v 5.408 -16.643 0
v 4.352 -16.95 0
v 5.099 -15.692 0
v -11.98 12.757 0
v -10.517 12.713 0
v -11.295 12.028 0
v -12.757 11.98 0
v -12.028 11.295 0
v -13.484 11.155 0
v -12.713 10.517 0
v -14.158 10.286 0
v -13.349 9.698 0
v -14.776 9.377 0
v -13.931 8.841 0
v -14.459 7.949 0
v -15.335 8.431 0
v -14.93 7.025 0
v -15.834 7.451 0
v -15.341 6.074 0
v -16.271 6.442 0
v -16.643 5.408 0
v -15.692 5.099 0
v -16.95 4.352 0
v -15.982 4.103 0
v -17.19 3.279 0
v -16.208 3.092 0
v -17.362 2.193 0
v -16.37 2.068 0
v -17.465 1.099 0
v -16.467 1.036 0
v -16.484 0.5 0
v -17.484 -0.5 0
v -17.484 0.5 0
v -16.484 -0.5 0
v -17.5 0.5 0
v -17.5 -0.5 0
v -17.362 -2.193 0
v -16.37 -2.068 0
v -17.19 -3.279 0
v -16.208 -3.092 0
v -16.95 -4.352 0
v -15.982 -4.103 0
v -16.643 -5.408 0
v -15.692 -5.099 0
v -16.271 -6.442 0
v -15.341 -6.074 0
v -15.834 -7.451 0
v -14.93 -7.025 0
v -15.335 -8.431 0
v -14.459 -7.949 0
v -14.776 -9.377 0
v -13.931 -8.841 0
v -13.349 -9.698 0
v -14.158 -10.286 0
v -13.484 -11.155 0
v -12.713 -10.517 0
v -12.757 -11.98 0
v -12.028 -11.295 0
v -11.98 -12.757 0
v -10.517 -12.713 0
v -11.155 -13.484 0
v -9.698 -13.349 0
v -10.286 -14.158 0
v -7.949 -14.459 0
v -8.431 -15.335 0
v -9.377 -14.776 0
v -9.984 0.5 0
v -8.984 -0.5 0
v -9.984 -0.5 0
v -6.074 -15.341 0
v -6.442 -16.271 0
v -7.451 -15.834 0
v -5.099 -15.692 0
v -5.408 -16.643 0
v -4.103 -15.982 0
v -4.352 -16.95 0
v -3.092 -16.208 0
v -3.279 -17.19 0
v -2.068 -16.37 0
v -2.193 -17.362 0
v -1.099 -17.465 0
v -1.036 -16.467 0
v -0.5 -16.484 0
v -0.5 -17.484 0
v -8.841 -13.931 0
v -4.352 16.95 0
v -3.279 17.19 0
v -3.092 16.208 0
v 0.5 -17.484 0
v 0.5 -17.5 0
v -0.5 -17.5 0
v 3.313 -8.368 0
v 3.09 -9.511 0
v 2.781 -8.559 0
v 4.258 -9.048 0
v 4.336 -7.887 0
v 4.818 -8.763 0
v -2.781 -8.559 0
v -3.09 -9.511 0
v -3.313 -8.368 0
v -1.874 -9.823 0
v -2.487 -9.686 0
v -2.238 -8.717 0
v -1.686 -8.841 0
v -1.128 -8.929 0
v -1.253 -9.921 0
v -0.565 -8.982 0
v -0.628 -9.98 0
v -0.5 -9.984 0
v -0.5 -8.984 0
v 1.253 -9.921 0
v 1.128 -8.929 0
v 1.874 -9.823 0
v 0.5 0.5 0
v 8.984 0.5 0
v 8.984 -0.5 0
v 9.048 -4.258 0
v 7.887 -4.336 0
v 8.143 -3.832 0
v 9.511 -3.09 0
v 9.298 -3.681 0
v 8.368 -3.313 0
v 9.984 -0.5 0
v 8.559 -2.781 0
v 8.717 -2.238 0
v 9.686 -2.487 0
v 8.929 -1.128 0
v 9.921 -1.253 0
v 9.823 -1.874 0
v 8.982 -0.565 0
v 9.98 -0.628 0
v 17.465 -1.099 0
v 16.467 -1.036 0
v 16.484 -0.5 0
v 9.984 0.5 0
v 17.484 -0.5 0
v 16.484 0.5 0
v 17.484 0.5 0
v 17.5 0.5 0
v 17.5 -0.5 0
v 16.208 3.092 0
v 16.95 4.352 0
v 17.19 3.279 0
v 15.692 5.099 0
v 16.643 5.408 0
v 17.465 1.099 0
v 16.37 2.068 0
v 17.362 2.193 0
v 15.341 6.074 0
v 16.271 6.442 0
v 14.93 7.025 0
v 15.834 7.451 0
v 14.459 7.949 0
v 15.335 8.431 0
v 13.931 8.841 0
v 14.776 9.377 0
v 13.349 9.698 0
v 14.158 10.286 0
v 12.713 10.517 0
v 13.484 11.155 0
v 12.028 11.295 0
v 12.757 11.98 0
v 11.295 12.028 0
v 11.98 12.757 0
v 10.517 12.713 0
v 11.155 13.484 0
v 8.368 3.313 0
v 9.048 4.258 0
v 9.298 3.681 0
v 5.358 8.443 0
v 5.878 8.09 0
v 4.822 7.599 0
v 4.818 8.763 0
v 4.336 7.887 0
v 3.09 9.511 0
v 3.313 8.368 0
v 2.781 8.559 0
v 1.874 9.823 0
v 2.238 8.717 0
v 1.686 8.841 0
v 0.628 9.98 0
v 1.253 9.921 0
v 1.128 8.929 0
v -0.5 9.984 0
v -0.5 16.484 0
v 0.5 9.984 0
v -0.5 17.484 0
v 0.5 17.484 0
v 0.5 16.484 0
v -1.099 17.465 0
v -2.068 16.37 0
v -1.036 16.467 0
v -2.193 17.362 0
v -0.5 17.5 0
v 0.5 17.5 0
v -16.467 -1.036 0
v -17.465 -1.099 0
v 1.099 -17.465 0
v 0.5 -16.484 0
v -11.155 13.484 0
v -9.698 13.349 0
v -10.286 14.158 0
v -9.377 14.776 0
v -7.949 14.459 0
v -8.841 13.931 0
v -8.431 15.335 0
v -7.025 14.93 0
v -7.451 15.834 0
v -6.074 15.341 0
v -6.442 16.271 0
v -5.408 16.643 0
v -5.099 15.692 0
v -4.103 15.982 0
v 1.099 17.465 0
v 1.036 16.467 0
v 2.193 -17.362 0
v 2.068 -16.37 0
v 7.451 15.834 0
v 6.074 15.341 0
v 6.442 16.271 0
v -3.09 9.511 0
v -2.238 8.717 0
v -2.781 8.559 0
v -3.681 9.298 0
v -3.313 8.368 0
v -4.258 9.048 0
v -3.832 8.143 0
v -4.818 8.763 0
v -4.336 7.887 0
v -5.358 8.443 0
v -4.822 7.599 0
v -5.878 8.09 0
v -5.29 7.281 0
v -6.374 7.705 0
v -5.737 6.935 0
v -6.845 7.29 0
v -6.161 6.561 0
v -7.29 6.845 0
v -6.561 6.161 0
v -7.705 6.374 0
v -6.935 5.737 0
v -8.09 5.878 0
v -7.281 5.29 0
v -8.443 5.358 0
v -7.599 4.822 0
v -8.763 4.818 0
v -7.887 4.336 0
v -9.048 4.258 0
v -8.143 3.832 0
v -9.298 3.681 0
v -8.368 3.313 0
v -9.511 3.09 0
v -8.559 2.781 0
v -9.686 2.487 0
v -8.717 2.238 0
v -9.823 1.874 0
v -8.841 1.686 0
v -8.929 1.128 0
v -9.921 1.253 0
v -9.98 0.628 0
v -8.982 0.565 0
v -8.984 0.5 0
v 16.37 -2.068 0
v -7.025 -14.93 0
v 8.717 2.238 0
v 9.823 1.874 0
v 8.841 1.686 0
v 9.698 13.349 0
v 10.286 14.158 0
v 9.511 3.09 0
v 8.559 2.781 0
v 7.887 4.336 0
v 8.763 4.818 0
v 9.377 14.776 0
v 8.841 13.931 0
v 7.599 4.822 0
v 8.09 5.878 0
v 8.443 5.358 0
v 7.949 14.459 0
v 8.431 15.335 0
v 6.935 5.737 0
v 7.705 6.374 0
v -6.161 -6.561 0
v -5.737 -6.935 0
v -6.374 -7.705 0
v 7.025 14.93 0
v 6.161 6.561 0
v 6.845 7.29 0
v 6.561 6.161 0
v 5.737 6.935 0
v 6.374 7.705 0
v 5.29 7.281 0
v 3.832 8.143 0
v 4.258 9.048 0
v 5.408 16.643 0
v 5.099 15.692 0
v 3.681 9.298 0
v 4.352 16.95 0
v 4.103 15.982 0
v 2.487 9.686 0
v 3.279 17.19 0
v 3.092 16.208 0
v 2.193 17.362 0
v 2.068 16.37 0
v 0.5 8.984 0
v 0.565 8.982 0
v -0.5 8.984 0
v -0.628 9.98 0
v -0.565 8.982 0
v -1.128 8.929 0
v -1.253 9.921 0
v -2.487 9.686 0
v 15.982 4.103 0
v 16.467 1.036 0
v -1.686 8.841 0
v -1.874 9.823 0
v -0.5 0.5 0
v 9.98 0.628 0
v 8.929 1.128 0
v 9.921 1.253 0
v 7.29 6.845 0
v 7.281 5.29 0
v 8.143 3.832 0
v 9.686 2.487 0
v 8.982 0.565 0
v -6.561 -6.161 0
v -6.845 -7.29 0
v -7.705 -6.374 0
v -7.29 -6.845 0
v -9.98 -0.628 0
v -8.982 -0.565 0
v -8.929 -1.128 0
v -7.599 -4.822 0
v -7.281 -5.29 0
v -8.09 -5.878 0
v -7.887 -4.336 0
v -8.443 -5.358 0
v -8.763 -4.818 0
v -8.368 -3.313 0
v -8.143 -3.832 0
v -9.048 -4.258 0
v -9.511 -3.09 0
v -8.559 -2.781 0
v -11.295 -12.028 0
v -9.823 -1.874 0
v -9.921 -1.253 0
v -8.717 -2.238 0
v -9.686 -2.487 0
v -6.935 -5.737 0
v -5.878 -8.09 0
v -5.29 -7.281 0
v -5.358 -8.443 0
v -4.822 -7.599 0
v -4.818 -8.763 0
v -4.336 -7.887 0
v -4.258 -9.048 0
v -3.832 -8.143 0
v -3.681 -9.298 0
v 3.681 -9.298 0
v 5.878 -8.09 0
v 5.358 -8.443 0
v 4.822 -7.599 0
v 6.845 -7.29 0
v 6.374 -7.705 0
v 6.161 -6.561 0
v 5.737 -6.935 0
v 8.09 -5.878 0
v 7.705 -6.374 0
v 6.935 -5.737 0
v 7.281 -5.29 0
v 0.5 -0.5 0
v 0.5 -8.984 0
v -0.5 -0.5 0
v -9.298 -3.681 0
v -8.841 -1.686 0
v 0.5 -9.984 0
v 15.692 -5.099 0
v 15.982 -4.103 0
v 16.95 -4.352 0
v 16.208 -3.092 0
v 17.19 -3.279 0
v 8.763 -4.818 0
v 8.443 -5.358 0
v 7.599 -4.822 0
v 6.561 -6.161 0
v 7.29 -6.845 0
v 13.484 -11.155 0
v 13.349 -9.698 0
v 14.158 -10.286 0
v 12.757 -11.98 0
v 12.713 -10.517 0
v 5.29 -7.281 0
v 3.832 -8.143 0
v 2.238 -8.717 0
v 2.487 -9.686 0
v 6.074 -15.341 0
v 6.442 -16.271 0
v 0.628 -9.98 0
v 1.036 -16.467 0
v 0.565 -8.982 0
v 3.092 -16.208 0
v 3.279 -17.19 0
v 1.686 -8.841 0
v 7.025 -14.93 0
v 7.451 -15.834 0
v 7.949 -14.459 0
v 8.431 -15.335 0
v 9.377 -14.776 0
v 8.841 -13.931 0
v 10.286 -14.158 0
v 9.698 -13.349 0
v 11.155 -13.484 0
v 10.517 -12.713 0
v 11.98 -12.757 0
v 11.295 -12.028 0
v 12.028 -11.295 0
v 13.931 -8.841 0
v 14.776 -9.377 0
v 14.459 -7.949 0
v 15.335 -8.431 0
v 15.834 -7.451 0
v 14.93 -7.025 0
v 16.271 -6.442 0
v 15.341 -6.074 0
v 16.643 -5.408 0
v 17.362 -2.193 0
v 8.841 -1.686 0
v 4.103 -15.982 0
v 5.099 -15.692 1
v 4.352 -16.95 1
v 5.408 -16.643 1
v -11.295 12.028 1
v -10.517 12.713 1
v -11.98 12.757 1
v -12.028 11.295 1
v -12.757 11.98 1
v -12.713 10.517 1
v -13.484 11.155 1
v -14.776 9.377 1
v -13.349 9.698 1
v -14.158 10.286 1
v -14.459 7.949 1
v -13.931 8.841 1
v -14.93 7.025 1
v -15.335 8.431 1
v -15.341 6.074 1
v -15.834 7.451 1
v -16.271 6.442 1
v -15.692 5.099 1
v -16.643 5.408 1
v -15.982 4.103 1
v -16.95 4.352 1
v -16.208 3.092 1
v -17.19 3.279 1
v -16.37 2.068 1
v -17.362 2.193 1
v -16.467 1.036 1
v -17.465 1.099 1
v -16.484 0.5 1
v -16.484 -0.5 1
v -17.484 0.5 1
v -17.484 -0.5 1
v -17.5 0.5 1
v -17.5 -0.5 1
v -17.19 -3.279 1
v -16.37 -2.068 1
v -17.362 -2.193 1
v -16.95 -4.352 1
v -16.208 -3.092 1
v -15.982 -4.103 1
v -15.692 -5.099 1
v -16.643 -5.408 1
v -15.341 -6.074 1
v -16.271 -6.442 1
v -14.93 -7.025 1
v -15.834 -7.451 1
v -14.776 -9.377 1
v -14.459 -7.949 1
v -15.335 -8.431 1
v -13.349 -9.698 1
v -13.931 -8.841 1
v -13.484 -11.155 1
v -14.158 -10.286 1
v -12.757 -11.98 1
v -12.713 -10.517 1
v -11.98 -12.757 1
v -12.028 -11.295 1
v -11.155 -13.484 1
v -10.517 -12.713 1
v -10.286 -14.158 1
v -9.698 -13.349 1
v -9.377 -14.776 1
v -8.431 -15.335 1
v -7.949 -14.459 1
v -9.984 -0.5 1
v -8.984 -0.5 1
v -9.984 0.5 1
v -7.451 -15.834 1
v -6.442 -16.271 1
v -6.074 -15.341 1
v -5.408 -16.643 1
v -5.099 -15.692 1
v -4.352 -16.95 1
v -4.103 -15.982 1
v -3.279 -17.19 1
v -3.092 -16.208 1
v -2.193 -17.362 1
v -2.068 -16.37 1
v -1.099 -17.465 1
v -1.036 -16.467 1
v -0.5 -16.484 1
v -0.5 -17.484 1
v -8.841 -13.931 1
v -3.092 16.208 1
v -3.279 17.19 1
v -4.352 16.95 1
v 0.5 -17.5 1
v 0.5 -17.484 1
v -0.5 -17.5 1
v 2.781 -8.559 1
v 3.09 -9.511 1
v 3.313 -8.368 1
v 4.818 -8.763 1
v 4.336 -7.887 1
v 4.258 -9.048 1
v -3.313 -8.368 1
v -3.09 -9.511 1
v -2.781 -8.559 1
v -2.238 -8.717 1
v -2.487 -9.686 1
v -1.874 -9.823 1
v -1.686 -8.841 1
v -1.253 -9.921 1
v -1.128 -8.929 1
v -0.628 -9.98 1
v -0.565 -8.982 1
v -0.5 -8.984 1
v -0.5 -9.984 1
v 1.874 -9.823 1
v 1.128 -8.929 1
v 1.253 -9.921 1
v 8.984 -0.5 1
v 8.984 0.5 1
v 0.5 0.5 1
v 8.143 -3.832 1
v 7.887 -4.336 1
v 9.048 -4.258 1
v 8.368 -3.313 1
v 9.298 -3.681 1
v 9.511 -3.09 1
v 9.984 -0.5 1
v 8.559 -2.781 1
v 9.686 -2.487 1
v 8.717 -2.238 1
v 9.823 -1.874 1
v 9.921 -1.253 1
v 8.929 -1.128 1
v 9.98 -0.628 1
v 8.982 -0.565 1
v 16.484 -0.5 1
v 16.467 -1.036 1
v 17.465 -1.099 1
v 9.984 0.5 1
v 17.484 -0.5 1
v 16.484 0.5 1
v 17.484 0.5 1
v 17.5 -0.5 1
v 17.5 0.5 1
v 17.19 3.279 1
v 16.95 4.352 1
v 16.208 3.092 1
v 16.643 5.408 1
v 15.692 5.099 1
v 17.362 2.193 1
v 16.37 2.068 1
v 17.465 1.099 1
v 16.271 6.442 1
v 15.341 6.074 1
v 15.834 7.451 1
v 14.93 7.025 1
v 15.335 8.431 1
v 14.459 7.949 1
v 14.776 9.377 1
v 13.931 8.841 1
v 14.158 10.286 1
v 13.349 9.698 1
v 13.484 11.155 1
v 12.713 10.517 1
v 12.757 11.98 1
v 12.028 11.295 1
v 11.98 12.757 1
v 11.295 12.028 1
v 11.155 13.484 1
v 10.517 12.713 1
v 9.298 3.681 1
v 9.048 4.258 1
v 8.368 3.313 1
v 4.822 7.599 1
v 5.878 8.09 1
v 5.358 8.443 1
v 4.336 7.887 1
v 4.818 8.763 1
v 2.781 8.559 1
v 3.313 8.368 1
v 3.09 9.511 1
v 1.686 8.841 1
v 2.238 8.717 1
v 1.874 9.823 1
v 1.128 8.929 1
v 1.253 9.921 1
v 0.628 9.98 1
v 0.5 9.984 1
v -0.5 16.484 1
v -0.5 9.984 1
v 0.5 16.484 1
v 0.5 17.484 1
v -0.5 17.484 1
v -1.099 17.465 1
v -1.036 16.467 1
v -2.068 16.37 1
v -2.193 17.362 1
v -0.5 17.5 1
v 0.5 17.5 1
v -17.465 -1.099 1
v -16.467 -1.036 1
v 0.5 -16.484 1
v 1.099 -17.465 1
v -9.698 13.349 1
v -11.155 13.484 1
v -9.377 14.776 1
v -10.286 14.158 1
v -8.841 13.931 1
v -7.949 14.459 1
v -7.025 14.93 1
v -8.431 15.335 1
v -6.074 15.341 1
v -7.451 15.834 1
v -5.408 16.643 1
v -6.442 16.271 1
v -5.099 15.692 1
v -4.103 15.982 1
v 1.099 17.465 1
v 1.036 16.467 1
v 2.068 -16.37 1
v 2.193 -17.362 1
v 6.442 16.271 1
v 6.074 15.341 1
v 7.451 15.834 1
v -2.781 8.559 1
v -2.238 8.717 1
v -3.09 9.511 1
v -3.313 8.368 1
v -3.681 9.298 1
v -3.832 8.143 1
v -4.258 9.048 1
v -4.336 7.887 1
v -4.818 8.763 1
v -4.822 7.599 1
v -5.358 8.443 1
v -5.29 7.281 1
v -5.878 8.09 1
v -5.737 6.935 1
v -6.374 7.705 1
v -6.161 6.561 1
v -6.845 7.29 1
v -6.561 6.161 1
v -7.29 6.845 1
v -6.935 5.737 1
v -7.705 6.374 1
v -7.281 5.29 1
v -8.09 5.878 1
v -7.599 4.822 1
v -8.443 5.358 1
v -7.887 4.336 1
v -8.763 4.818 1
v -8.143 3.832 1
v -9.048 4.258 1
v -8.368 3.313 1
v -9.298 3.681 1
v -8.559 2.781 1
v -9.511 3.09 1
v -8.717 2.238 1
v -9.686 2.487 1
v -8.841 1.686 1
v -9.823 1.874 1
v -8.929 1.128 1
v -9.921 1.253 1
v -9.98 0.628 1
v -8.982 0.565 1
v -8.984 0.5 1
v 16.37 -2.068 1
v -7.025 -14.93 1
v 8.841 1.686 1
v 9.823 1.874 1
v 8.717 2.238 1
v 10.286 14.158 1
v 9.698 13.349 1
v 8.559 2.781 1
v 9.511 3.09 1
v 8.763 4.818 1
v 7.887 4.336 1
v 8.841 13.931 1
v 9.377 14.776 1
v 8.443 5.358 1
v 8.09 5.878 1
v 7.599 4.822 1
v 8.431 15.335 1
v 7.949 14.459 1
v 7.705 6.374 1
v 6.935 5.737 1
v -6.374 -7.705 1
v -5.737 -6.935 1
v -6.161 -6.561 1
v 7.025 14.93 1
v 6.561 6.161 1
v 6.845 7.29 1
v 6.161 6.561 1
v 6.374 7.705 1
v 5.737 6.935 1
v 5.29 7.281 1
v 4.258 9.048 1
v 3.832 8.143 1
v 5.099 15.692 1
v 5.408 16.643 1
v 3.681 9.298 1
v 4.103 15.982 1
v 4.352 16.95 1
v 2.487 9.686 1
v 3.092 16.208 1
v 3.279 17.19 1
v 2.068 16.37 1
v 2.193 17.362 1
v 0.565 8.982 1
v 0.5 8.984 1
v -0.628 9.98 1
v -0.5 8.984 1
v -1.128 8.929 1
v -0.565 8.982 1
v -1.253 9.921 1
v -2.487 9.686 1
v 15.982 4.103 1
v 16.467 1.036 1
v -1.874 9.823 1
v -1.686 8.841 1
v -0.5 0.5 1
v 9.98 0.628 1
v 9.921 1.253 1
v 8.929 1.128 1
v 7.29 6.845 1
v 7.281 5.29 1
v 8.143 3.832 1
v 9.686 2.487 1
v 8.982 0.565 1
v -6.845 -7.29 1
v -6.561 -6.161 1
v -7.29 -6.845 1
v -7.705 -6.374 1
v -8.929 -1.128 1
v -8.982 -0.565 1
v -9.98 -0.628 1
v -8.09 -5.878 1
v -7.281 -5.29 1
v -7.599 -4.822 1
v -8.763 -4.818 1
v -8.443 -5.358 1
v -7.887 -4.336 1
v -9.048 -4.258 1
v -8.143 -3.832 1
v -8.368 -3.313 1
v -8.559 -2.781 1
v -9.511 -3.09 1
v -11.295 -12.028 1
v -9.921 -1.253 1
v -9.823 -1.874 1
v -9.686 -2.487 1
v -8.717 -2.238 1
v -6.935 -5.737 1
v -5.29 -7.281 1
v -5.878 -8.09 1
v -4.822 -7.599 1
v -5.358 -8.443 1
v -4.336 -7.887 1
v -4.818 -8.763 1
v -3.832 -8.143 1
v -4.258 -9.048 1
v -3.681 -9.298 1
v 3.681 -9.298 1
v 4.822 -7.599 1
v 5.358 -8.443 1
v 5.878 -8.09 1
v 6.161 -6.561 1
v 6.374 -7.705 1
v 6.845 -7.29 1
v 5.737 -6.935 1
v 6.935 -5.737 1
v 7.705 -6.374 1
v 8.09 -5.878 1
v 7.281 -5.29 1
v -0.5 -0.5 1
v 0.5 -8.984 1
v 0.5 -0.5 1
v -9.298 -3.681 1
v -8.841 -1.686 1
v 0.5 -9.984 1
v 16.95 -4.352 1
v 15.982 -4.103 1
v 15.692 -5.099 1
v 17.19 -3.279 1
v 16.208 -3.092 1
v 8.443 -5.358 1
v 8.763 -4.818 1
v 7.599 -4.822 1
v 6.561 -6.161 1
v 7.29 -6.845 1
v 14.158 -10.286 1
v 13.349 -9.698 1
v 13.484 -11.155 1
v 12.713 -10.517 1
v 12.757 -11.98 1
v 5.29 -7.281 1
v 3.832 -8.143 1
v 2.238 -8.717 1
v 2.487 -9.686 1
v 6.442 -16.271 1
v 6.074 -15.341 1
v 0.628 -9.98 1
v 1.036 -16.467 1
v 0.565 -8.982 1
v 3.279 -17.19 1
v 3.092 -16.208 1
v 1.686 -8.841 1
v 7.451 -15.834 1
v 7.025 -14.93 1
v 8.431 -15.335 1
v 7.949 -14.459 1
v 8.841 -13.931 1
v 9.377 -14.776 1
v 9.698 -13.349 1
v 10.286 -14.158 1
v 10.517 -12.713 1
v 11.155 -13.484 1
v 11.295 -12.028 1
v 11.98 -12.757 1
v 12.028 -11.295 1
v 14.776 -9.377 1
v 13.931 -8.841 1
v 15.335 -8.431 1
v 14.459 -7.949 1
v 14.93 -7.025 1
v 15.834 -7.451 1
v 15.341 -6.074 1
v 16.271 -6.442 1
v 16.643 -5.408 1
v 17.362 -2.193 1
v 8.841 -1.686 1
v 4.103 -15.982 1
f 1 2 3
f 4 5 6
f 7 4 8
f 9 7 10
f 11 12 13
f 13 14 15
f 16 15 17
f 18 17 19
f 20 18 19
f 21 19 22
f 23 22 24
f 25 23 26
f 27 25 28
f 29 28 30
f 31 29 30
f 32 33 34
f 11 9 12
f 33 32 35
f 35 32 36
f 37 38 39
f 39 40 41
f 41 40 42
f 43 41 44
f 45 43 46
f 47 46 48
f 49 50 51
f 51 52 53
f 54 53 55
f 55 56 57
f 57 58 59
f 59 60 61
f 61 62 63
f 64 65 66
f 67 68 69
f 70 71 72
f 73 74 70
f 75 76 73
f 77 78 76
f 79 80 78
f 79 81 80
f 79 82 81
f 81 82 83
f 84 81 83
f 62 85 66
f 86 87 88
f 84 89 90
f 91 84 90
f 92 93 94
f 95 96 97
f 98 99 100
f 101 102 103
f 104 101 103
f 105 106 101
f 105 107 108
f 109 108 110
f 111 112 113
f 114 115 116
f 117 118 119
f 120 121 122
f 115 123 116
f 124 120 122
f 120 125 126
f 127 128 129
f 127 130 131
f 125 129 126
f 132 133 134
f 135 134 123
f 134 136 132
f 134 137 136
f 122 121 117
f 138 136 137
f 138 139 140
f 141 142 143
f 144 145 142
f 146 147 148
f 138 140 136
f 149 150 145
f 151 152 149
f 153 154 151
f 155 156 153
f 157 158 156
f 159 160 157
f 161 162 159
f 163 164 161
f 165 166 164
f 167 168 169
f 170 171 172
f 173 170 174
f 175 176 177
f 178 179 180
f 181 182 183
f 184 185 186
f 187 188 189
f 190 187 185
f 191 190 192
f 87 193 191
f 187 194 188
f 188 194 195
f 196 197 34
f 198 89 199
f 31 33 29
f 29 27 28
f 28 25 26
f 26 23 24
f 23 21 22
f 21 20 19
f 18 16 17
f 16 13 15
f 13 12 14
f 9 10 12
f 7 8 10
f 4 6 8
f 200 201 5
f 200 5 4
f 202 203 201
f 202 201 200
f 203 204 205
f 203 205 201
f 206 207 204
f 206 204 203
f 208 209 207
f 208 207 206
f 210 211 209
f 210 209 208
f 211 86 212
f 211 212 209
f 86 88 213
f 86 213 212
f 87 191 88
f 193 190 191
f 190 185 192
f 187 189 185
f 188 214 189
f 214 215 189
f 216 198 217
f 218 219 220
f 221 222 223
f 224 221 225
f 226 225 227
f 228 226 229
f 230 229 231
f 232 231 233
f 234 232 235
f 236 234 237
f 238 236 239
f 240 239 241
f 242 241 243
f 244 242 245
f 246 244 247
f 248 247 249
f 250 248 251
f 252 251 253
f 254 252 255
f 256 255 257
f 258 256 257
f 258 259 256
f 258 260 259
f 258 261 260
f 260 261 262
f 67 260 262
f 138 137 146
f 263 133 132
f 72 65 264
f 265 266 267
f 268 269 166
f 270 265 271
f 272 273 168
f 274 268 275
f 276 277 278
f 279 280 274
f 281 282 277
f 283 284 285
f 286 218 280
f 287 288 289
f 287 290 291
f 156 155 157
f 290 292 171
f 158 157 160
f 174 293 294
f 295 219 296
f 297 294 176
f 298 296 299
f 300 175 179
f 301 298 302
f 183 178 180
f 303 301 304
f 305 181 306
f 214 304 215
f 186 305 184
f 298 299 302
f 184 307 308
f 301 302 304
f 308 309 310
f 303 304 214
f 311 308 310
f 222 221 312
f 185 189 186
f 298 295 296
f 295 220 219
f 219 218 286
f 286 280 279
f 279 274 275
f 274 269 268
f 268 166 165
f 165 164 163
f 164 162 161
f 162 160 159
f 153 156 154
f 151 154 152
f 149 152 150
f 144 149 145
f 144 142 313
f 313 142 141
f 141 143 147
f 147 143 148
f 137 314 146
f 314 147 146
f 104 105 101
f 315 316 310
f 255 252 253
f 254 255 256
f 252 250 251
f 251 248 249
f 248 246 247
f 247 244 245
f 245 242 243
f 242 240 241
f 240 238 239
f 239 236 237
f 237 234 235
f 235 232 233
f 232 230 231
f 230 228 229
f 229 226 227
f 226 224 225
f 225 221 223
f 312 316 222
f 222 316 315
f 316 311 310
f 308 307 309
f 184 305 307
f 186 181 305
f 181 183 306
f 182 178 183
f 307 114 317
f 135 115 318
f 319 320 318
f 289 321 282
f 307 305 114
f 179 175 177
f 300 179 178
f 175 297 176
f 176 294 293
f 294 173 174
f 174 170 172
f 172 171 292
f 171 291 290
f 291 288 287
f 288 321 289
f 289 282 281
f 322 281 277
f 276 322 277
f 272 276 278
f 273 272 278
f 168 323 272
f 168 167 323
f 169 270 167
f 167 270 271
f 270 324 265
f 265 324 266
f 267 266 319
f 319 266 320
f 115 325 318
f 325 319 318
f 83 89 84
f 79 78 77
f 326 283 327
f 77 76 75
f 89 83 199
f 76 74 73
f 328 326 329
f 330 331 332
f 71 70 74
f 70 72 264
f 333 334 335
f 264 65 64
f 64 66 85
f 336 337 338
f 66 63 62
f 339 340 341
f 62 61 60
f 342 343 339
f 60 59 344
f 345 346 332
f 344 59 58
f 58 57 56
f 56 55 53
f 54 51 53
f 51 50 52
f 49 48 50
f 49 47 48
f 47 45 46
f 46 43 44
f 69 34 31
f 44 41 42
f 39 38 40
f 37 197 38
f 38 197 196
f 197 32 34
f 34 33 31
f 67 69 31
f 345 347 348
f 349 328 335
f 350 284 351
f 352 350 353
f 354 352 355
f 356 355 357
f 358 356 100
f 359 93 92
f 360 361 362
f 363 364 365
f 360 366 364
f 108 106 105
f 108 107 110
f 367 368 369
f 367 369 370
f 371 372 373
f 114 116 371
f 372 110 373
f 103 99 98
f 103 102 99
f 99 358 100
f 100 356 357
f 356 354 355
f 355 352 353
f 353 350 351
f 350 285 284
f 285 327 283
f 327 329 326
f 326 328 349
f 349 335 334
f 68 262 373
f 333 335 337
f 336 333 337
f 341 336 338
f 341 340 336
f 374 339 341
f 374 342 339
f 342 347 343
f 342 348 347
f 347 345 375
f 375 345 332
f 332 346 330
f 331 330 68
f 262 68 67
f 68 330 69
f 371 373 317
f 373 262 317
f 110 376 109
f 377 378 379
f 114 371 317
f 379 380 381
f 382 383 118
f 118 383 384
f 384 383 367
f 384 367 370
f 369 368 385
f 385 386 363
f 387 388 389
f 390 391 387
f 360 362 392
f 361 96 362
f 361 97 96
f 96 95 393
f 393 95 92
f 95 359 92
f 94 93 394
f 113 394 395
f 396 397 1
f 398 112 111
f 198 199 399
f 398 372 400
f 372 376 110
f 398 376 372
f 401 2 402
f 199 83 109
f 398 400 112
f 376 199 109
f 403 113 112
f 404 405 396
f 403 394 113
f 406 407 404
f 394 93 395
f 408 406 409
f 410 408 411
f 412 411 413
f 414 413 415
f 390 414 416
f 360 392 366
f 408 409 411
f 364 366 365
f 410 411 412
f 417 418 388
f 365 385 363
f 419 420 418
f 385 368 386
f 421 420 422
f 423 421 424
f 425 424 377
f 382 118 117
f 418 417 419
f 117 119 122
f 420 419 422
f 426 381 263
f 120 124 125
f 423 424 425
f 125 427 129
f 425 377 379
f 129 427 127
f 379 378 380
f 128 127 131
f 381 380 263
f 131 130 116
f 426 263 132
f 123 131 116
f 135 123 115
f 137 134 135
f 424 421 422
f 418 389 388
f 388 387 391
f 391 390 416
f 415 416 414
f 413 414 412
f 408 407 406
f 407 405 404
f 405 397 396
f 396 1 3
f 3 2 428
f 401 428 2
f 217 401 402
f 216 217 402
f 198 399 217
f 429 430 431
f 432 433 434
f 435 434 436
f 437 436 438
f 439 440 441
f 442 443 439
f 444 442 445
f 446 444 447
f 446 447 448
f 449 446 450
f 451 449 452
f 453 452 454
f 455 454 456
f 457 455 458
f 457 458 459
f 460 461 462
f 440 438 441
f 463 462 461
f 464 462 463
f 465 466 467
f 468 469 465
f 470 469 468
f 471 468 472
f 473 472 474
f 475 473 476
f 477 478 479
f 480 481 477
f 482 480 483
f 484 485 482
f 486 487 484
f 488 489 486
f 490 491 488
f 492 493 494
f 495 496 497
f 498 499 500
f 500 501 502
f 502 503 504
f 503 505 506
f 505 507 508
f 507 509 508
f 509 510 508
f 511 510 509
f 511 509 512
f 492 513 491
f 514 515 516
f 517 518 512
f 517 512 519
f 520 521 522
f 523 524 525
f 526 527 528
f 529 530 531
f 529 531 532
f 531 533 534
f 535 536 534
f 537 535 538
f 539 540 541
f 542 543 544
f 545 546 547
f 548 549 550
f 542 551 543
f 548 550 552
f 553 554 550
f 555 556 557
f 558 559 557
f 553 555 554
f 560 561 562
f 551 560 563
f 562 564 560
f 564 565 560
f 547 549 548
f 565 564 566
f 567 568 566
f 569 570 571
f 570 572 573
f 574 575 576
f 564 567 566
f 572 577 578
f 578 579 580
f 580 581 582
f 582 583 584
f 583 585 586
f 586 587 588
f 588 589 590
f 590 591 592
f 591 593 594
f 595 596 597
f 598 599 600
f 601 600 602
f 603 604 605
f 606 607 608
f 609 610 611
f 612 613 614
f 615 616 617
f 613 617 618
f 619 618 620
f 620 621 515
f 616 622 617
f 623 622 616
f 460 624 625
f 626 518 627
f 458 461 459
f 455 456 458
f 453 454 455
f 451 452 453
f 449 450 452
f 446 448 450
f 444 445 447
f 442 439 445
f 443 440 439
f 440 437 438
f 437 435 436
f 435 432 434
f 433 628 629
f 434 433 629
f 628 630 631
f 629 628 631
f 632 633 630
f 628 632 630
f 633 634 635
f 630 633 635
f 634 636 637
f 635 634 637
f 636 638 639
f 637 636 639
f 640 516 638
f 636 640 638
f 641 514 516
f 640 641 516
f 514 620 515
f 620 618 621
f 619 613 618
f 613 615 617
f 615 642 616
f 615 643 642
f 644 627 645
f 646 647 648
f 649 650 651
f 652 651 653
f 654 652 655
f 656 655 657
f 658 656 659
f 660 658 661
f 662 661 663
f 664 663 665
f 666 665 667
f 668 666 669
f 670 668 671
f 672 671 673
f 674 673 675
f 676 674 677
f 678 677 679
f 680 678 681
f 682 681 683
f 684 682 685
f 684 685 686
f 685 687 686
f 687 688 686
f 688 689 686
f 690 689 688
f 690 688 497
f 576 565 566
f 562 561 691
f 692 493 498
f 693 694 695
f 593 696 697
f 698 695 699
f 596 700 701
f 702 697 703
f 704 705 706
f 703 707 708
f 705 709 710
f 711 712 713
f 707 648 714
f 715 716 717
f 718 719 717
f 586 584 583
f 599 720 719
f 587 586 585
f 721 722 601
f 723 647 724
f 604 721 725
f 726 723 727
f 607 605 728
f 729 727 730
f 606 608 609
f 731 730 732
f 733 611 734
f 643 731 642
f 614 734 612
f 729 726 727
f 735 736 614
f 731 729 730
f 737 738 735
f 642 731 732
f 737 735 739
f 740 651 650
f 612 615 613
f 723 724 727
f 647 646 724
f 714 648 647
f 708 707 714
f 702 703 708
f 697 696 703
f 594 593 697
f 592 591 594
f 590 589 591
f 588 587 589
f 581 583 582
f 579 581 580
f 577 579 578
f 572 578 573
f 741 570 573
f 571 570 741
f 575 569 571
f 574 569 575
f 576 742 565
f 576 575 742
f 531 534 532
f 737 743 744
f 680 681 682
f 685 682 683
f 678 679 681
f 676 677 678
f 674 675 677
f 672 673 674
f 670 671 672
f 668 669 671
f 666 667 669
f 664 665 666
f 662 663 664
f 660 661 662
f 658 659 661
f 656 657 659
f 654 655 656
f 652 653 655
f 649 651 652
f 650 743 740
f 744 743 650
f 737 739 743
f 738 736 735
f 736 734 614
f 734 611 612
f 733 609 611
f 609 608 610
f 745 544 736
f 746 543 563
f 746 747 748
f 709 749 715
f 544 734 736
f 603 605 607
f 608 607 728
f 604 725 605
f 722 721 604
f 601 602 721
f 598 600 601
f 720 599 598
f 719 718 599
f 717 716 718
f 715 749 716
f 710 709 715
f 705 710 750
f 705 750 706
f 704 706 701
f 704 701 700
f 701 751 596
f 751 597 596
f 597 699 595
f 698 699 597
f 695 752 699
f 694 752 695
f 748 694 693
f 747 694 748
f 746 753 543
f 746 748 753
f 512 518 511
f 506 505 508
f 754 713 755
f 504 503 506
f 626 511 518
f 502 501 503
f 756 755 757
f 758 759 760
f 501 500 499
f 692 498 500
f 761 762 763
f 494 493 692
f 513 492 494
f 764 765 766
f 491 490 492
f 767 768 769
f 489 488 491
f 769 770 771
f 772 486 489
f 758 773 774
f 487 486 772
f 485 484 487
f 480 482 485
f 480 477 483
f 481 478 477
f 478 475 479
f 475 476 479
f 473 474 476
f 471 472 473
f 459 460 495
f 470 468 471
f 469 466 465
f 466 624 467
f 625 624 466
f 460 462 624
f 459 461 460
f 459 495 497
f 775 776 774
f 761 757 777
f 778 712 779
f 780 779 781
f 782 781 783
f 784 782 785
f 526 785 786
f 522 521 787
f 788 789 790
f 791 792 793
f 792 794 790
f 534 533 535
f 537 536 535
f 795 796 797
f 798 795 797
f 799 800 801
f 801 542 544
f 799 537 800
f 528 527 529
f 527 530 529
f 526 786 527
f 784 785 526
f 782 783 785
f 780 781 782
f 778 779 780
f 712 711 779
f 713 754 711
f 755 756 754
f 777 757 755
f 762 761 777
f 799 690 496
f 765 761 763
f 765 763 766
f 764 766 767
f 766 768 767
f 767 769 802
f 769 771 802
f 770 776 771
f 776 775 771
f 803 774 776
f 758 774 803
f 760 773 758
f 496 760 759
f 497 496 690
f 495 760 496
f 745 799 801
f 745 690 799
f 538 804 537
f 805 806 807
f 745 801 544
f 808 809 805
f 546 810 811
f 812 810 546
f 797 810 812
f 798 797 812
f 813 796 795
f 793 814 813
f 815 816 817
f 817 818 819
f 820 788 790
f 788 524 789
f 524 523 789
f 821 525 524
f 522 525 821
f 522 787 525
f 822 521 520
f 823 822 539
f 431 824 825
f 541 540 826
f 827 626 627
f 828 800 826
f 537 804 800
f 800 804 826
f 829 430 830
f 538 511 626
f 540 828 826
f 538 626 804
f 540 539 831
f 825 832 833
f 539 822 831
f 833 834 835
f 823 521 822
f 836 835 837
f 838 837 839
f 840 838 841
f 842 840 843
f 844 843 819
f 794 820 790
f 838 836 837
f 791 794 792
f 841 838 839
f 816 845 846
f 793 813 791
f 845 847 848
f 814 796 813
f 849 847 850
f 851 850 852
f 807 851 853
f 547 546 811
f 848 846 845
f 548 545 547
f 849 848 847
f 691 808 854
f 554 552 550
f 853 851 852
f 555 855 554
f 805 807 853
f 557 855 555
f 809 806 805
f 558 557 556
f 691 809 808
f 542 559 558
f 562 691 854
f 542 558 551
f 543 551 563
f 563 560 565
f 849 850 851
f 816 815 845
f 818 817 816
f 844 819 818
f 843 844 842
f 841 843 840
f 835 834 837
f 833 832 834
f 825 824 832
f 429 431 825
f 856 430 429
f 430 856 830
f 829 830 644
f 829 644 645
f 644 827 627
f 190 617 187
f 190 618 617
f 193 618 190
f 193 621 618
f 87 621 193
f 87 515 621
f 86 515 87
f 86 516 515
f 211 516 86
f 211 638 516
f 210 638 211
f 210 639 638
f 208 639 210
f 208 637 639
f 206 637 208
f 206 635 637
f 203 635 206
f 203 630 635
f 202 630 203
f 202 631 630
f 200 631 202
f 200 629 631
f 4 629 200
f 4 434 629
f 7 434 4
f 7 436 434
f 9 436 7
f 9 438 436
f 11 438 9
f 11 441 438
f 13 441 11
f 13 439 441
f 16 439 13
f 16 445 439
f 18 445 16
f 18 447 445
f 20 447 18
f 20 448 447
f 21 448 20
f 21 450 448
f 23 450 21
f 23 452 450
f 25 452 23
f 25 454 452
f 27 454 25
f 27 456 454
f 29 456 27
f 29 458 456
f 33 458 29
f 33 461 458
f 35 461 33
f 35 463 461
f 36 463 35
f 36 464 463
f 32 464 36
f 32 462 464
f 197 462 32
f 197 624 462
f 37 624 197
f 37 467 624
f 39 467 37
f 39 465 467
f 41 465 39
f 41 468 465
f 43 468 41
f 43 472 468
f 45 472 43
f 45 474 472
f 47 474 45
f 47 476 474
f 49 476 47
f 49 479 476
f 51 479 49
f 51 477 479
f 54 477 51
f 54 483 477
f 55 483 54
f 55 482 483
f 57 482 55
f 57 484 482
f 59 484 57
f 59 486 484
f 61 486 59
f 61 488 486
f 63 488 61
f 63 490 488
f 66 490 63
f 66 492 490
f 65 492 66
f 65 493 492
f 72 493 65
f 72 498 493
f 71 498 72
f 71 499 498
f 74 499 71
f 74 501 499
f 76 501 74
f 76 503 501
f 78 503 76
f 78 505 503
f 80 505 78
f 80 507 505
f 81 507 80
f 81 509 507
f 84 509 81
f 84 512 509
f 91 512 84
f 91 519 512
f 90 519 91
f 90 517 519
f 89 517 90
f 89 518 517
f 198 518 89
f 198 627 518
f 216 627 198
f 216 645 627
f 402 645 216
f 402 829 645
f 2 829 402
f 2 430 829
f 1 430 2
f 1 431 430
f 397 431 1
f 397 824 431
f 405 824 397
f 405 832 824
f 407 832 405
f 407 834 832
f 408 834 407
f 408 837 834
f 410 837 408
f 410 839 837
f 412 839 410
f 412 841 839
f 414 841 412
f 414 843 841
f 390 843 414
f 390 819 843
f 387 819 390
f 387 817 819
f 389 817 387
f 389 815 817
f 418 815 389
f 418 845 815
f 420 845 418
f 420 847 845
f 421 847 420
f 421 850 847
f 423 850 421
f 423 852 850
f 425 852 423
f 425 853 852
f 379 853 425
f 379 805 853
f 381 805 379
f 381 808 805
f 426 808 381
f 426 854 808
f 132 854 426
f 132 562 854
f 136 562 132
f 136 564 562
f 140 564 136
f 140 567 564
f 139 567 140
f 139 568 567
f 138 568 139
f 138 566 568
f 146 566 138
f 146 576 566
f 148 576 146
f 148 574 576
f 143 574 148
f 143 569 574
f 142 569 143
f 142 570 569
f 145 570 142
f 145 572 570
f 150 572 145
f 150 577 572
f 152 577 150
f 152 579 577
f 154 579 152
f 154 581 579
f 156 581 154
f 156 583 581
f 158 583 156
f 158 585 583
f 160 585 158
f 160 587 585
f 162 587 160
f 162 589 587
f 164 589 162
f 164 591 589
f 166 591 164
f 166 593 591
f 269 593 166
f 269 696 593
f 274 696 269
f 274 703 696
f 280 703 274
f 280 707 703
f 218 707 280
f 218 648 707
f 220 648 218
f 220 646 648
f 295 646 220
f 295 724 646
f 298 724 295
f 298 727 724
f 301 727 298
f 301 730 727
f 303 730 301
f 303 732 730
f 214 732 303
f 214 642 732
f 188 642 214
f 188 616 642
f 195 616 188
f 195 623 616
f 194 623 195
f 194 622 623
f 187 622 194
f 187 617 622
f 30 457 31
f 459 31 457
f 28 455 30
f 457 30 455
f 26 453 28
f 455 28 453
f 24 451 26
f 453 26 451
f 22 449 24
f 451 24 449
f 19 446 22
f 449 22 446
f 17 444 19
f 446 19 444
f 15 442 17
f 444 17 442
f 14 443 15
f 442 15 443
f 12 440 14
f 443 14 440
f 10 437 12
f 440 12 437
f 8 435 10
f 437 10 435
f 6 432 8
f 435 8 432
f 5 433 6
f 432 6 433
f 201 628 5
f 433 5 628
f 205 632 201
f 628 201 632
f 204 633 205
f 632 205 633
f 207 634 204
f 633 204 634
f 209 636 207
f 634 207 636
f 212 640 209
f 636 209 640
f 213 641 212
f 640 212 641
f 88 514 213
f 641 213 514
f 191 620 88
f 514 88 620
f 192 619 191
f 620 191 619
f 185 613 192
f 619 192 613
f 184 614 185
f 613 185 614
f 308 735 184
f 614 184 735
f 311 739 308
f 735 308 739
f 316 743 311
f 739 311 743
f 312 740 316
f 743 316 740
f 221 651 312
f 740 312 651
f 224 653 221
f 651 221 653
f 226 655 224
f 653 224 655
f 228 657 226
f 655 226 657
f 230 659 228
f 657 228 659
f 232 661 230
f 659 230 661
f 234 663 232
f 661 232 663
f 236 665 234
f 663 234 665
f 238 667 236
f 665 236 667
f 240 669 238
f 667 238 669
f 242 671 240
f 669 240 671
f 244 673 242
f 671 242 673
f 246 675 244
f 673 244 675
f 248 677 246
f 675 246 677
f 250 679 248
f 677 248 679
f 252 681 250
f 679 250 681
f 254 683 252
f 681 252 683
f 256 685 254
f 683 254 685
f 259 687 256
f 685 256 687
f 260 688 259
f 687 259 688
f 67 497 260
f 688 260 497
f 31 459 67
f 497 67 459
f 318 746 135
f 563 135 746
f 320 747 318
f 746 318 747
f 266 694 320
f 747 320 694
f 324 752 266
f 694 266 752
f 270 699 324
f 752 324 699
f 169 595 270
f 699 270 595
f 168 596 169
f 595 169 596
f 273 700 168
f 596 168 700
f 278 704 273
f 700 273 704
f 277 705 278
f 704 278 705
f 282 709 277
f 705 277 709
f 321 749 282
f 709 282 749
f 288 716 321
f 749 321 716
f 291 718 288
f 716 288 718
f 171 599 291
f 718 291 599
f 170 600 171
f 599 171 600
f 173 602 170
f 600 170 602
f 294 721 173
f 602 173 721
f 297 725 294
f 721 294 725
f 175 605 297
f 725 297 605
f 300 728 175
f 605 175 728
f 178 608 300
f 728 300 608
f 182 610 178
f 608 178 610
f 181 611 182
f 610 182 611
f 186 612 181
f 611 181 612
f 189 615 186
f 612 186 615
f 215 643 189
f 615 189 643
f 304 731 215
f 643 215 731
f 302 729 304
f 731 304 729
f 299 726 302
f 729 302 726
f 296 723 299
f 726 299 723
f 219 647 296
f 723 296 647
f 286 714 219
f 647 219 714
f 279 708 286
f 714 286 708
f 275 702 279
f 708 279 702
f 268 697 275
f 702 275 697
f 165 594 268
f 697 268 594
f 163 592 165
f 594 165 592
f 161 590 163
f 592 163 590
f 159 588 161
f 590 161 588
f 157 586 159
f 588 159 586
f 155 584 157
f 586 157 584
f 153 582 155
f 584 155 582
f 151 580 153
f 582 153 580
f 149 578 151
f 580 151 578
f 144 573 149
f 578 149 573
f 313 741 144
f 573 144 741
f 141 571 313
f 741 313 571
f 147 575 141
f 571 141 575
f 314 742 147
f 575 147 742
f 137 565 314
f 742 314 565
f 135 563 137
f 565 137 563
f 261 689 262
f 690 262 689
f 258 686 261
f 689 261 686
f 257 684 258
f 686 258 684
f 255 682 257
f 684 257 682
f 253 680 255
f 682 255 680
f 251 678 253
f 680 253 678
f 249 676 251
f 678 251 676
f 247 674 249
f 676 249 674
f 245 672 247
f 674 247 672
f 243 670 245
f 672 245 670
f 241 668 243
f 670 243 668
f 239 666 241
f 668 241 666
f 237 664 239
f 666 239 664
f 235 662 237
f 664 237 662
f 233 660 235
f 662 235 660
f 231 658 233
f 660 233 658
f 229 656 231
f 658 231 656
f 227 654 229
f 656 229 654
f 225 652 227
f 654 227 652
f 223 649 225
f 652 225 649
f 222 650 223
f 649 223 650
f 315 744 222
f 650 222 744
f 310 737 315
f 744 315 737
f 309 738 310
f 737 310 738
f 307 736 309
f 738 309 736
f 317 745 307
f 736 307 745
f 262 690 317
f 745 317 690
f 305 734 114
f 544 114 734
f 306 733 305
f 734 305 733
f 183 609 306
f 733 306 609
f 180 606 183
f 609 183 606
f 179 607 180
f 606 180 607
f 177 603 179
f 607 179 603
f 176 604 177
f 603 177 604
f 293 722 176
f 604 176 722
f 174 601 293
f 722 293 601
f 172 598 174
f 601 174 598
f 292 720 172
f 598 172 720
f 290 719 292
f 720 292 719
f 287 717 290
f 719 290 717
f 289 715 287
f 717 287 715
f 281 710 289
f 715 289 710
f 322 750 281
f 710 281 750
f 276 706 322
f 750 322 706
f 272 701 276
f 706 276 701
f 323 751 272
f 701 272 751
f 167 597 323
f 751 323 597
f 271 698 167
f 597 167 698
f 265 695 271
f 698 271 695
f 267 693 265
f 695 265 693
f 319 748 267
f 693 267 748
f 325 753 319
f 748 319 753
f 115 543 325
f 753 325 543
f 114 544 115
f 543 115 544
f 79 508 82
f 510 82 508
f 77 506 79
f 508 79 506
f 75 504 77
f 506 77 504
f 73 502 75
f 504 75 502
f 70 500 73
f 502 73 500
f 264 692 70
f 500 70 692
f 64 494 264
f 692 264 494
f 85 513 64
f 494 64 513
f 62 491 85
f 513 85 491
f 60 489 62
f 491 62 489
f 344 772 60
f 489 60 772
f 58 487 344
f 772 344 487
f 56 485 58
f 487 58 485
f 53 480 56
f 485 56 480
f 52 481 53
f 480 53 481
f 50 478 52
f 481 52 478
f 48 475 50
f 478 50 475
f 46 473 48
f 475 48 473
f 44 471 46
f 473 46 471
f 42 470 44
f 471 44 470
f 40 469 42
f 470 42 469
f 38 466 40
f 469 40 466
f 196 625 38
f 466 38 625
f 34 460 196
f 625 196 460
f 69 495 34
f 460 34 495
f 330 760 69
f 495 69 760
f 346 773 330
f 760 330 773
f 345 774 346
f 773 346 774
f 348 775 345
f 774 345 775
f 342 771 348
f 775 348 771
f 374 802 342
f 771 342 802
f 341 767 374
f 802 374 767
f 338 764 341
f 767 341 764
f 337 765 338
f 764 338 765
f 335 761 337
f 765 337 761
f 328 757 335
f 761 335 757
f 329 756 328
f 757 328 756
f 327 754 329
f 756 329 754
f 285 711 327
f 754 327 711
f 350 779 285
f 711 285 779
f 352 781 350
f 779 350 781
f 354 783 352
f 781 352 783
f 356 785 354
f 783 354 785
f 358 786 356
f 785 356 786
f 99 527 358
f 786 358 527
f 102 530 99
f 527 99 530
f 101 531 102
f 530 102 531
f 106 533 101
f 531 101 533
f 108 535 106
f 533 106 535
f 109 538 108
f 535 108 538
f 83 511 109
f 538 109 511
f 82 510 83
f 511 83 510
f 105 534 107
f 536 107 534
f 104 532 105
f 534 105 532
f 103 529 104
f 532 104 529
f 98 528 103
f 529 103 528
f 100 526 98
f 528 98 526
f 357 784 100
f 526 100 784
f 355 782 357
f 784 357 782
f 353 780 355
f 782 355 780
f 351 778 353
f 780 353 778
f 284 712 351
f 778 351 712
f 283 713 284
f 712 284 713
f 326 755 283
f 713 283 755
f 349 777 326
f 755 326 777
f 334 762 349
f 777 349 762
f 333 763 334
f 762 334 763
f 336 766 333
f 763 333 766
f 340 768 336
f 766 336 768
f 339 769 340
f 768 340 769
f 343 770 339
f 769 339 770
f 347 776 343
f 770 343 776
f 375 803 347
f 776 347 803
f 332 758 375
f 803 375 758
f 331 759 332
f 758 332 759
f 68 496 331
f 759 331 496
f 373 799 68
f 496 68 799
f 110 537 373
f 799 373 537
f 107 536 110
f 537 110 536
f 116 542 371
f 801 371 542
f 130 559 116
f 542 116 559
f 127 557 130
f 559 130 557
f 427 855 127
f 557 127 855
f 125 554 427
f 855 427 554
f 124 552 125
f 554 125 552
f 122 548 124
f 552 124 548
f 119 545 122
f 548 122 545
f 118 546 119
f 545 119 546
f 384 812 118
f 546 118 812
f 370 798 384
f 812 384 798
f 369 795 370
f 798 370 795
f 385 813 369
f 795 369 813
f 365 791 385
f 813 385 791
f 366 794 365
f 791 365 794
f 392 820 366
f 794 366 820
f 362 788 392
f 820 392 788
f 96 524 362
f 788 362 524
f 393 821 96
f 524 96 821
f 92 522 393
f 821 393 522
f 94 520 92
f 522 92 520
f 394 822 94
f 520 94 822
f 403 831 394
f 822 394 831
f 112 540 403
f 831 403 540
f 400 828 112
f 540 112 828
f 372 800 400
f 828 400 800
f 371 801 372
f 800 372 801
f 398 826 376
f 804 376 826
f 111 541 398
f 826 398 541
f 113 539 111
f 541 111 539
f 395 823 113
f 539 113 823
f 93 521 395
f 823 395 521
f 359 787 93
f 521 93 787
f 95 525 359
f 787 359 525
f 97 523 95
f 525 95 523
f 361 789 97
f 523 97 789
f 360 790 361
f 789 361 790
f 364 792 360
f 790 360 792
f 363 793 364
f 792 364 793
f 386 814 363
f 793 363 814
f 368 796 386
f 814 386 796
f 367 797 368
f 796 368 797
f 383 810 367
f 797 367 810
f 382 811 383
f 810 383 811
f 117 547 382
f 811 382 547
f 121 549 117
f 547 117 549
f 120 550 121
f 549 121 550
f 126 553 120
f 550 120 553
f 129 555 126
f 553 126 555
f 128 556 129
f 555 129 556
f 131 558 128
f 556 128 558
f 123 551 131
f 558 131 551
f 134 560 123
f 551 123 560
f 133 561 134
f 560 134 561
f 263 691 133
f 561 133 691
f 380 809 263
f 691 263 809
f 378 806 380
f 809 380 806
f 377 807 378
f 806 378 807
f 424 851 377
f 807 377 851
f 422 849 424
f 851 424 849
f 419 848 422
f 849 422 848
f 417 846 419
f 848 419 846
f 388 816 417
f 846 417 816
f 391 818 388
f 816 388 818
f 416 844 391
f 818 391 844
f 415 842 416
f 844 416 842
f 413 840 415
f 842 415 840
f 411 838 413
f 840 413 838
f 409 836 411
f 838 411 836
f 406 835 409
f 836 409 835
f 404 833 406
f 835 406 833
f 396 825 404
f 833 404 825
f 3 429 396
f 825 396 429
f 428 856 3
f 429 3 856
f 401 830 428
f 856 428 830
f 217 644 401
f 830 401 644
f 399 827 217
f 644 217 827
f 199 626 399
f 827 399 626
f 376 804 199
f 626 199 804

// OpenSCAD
$fn = 100;


outerRingDiameter = 35;
middleRingDimeter = 20;
innerRingDiameter = 6;
linear_extrude(1) { 
union() {
    
ring(outerRingDiameter);
ring(middleRingDimeter);
//ring(innerRingDiameter);

translate([-0.5, -outerRingDiameter/2, 0]) square([1, outerRingDiameter]);
translate([-outerRingDiameter/2, -0.5, 0]) square([outerRingDiameter, 1]);

}

}

module ring(dia) {

    difference() {
        circle(d=dia);
        circle(d=dia-2);
    }

}
